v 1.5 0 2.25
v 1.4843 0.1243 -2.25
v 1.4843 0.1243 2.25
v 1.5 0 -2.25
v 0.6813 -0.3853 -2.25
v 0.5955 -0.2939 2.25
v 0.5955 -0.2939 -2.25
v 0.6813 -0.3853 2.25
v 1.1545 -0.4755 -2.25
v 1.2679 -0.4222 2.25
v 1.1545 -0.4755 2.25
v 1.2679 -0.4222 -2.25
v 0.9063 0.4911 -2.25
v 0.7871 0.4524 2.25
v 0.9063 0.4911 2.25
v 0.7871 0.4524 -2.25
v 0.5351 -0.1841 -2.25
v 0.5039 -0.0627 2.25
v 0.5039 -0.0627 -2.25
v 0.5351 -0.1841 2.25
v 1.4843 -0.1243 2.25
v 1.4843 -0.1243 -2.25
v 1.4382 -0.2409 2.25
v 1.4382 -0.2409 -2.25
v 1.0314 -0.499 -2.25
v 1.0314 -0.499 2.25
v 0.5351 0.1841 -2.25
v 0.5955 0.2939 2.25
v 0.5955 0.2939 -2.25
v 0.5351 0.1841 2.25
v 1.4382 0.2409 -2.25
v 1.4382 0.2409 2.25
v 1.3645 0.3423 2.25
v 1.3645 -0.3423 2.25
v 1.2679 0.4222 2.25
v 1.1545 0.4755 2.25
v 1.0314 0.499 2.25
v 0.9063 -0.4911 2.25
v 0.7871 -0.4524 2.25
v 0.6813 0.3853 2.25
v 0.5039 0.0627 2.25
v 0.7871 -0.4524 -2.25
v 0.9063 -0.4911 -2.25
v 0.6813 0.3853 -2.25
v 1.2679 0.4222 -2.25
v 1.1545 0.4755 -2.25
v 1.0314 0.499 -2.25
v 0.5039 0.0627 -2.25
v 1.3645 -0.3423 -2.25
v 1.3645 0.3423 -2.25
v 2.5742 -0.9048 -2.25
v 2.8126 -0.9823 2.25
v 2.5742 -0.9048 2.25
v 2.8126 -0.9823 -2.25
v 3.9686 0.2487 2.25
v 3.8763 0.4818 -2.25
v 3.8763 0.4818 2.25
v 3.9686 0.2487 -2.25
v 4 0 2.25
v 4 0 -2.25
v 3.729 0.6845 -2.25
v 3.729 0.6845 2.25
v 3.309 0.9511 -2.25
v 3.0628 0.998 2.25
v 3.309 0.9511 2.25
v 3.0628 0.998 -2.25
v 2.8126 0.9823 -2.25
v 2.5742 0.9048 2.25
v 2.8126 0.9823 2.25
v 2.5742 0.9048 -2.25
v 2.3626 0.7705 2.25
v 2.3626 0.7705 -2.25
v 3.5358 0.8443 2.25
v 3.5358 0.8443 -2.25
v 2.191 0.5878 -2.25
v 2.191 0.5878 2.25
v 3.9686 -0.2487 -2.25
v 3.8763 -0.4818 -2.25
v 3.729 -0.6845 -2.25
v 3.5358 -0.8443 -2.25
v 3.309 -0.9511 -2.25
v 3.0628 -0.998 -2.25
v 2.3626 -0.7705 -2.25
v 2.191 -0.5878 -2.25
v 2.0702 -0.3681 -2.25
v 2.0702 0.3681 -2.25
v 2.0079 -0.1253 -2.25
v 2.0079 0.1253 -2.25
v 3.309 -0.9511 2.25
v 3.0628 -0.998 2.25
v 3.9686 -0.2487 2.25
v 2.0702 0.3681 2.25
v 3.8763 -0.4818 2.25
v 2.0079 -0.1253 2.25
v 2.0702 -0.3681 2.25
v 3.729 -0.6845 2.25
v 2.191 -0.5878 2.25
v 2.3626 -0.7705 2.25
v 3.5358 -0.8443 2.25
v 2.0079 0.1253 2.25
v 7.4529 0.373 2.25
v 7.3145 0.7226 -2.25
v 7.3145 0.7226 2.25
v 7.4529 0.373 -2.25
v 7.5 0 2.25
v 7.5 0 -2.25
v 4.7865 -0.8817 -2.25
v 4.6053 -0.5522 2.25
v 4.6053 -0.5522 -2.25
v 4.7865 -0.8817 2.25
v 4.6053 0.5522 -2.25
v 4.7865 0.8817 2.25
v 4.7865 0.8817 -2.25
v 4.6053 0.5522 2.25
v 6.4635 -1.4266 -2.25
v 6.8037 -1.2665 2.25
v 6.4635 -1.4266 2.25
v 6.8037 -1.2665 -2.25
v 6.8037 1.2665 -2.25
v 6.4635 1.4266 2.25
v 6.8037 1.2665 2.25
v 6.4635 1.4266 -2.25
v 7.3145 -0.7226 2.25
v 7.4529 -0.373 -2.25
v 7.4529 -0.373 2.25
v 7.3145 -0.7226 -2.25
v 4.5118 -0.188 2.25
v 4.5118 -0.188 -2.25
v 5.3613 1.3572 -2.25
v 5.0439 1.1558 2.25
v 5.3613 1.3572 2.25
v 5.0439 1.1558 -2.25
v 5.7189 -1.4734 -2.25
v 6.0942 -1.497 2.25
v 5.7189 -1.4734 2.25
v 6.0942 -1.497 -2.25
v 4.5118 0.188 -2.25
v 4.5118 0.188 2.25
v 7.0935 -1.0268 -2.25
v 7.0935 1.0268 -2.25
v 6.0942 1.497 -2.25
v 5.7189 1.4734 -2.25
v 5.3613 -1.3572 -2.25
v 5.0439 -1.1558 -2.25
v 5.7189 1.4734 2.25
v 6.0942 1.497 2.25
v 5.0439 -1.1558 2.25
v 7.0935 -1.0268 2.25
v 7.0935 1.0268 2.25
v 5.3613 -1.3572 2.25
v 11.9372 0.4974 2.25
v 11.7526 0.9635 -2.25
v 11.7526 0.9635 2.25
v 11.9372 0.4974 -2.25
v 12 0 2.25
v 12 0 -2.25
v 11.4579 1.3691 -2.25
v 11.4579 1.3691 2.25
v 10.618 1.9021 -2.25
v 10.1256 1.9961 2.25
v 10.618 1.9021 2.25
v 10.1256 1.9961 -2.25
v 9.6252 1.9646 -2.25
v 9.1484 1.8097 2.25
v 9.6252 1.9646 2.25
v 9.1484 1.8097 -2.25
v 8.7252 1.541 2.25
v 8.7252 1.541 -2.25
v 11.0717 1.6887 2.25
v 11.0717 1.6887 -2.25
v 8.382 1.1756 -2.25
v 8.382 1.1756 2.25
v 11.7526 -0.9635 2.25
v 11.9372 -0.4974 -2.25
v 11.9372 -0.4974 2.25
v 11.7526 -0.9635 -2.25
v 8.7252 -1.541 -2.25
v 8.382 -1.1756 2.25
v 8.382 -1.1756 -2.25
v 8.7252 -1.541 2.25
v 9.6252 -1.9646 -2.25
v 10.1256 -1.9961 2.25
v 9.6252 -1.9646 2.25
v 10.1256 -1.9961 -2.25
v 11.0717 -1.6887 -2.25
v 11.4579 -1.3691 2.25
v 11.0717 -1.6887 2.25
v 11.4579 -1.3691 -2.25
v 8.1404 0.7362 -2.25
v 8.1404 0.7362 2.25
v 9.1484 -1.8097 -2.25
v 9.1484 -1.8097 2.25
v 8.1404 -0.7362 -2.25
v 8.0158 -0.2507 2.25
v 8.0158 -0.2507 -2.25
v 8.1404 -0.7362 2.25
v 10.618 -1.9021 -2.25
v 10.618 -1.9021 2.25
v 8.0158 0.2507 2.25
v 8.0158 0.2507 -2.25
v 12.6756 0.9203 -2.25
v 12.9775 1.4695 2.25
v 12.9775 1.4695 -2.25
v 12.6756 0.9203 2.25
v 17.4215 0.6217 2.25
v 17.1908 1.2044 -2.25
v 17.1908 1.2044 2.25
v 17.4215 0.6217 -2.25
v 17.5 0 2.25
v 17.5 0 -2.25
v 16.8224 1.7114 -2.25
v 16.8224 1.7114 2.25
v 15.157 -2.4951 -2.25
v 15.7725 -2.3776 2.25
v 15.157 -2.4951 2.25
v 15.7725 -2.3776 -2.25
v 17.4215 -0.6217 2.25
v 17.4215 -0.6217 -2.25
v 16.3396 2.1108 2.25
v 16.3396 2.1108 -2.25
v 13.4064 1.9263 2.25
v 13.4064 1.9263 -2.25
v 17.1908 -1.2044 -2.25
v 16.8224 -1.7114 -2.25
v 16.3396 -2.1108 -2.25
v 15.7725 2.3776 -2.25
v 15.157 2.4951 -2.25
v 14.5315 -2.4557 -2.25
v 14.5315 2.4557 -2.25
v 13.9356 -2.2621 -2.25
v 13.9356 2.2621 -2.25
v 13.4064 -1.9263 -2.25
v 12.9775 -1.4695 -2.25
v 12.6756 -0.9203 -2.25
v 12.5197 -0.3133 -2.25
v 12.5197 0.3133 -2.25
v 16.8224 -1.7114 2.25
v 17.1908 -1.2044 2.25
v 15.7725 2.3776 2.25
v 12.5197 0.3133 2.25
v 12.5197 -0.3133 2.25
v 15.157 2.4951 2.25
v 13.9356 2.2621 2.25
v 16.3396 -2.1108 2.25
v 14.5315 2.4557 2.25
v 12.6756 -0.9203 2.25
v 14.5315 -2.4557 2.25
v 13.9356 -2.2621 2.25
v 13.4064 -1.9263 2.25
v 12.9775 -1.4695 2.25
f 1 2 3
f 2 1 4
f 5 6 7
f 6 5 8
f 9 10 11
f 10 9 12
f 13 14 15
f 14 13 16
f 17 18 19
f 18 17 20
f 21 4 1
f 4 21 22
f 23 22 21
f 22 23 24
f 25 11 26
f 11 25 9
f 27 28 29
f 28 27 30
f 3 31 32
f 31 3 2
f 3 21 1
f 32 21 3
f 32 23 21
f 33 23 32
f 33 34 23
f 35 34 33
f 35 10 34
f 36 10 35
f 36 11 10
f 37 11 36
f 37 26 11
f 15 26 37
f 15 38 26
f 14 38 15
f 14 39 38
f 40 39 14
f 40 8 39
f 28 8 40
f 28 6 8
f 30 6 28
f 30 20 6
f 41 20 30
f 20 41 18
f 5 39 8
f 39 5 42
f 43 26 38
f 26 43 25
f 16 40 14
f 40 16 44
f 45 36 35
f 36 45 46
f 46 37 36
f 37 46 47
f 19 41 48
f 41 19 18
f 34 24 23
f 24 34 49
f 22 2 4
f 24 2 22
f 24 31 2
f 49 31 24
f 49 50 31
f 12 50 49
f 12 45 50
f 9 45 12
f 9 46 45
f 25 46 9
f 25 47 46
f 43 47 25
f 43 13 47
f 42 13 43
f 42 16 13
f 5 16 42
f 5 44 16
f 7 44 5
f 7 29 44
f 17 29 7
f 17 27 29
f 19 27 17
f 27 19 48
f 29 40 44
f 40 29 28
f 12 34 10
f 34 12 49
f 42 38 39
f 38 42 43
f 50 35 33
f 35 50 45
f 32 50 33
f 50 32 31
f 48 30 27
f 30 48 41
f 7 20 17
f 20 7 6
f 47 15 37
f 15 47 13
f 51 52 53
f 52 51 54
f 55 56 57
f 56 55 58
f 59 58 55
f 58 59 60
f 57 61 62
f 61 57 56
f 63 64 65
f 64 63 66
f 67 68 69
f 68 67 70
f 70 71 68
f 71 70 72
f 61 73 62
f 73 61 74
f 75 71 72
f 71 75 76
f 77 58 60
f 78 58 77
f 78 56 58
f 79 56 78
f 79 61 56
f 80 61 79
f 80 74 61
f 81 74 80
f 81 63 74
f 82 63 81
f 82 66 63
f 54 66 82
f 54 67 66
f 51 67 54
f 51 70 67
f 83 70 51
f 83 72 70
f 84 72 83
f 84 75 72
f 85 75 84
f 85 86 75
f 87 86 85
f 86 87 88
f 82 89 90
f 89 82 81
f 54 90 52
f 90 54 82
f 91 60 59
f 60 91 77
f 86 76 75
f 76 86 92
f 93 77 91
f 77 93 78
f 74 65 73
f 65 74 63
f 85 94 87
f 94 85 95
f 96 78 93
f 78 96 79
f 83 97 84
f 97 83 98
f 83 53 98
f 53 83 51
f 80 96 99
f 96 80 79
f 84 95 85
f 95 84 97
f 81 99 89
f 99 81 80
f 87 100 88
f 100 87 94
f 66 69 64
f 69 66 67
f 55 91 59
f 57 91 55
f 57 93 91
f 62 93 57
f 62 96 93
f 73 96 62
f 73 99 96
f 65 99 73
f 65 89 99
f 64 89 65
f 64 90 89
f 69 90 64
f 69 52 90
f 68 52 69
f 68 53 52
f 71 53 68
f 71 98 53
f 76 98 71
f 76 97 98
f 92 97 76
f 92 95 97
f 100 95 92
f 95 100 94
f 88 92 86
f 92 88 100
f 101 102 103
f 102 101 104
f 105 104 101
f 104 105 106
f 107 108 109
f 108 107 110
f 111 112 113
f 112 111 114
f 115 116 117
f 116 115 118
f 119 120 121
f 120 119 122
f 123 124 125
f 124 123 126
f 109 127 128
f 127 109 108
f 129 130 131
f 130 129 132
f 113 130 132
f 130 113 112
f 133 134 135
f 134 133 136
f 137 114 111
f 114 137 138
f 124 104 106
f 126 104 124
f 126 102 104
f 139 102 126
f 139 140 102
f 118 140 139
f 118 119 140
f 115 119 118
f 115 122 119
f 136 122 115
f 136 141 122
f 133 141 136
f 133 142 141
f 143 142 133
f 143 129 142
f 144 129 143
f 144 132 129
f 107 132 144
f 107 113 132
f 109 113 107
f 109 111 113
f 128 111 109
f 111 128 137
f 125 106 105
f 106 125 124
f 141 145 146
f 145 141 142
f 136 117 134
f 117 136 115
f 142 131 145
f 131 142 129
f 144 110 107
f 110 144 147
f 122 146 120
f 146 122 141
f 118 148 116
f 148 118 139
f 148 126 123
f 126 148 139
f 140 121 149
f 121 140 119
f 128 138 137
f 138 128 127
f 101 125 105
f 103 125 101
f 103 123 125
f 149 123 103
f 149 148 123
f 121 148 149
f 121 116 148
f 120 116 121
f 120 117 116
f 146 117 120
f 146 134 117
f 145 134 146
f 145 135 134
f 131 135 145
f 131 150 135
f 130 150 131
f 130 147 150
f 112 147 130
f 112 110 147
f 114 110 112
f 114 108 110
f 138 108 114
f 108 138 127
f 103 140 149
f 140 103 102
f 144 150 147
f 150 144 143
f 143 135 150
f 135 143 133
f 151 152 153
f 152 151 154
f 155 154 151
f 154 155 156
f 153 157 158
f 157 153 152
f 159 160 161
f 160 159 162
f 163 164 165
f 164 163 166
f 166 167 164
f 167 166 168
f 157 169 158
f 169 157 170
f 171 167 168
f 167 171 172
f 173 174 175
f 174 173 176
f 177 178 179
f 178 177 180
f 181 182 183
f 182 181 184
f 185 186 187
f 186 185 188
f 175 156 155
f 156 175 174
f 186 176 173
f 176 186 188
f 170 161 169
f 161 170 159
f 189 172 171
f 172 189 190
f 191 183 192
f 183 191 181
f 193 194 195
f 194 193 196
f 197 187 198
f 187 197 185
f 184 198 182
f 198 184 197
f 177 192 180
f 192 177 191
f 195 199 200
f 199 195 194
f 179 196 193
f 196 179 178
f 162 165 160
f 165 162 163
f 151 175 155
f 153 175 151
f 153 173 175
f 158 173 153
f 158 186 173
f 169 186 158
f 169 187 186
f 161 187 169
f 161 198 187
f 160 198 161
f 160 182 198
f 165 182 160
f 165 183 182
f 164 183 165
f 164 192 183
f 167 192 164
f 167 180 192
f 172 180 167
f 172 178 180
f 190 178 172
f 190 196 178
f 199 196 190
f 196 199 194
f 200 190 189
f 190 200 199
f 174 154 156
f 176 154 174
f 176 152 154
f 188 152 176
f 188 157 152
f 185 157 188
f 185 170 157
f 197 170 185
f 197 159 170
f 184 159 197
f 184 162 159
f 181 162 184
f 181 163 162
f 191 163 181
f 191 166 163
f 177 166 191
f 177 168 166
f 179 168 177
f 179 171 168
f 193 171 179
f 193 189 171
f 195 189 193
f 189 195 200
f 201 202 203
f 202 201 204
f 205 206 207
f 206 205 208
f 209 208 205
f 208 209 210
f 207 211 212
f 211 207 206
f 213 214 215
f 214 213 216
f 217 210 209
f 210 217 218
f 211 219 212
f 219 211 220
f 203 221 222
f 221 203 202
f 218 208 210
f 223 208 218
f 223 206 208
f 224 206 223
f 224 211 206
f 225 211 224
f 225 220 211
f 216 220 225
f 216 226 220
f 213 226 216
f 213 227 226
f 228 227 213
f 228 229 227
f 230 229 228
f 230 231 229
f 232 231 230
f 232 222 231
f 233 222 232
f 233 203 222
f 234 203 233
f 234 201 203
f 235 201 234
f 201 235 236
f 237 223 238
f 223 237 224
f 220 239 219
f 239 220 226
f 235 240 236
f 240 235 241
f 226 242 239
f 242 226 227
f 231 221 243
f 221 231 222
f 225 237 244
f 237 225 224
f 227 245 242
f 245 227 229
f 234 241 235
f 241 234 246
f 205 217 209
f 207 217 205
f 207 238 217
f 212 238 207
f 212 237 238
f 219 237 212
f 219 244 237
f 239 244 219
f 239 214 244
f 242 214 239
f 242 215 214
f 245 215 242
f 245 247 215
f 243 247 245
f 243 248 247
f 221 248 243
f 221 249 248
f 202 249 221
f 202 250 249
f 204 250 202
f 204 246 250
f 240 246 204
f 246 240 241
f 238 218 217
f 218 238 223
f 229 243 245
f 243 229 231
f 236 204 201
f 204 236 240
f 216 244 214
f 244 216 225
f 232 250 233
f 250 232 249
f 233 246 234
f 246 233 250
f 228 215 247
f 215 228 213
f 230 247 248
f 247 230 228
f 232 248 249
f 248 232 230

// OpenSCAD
start = 1;
inc   = .25;
end   = 5;

pad   = 1;
depth = 4.5;
ttt = 0;

difference()
{
/*
	translate([0,-3.5,-depth/2-2])
		cube([18, 7, depth+2]);
		*/

	for(i = [start : end])
	{
		translate([i*(i+1)/2,0,0])
			cylinder(d=i, h=depth, center=true, $fn=25);
	}

}
